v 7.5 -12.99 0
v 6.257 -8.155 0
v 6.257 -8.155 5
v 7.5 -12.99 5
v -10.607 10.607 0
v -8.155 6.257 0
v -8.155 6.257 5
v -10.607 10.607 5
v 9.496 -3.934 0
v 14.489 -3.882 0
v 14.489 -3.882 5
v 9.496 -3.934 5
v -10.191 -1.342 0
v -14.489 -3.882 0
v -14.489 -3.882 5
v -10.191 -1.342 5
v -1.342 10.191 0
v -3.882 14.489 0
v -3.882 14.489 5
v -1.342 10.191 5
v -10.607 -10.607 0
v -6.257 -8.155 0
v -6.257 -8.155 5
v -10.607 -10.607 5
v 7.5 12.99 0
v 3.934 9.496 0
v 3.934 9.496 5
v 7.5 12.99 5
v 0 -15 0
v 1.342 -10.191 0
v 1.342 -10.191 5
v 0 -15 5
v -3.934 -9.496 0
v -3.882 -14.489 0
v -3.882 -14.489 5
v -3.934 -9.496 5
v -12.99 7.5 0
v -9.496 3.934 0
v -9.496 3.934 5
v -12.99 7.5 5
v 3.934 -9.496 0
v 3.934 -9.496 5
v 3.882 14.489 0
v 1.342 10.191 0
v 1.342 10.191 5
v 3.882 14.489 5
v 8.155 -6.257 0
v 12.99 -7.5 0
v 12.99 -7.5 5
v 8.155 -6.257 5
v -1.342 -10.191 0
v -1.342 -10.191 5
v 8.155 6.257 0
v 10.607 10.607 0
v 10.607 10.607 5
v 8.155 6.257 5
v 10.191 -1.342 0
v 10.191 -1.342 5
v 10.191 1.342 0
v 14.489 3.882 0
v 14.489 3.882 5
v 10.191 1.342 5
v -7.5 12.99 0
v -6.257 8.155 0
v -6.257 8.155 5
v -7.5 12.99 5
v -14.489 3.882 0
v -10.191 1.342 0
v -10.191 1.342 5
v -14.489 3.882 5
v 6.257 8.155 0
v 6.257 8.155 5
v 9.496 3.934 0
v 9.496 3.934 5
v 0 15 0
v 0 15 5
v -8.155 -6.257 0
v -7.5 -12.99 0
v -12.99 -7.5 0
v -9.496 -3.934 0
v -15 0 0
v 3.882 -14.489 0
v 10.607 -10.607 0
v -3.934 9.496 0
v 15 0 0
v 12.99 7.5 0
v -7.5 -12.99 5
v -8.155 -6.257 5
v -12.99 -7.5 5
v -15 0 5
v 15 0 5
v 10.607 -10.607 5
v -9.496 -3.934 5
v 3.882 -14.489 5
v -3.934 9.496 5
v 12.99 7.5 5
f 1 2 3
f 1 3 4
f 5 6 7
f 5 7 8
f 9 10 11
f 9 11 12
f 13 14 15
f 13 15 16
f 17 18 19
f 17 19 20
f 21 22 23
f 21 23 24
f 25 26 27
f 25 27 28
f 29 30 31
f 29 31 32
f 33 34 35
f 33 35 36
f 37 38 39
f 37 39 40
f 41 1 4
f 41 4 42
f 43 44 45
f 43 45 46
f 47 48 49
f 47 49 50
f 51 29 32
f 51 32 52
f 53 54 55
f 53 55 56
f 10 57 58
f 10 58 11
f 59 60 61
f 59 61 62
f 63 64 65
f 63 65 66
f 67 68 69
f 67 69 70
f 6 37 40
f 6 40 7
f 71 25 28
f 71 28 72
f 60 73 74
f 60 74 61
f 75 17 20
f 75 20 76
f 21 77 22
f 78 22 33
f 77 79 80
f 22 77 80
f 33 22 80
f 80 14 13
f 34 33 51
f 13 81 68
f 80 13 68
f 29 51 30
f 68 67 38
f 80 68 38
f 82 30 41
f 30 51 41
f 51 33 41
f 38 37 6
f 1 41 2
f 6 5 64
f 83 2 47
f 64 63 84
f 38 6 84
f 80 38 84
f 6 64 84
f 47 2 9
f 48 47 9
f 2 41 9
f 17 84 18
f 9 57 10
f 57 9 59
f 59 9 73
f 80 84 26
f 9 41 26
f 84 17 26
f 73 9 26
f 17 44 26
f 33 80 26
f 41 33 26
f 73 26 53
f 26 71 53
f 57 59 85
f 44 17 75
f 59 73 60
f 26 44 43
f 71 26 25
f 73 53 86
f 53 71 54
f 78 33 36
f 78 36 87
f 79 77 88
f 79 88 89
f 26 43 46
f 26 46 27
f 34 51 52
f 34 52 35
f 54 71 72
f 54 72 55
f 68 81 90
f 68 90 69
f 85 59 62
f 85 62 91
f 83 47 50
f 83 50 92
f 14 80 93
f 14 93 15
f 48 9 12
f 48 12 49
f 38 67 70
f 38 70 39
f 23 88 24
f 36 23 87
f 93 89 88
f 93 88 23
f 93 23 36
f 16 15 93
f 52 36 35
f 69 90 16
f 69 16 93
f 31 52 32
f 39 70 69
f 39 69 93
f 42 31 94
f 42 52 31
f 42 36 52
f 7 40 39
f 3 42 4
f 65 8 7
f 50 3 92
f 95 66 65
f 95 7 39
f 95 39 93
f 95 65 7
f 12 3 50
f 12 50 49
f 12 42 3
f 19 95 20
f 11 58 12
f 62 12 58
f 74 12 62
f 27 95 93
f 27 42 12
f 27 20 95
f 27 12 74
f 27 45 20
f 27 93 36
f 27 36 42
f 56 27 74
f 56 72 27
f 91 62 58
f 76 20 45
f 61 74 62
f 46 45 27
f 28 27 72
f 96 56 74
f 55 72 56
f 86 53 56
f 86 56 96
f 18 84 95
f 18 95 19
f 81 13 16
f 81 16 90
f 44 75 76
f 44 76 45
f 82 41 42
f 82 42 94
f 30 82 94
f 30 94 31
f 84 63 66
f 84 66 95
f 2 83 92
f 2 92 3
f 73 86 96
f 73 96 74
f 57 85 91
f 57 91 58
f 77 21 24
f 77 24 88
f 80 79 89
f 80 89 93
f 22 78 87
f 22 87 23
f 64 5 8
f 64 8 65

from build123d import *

# Parameters (mm, degrees)
ESQUISSE1_R             = 15
BOSS_EXTRU_1_DEPTH      = 5
ENL_V_START             = -5
ENL_V_MAT_EXTRU_1_DEPTH = 5


with BuildPart() as part:
    # Esquisse1 → Boss.-Extru.1 (new body)
    with BuildSketch(Plane.XY):
        Circle(ESQUISSE1_R)
    extrude(amount=BOSS_EXTRU_1_DEPTH)

    # Esquisse2 → Enlèv. mat.-Extru.1 (cut)
    with BuildSketch(Plane.XY.offset(5).offset(ENL_V_START)):
        with BuildLine():
            Line((-6.257363421, 8.154754778), (-7.5, 12.990381057))
            ThreePointArc((-7.5, 12.990381057), (-9.131421435, 11.900300104), (-10.606601718, 10.606601718))
            Line((-10.606601718, 10.606601718), (-6.257363421, 8.154754778))
        make_face()
        with BuildLine():
            Line((-3.933543089, 9.496413072), (-3.882285677, 14.488887394))
            ThreePointArc((-3.882285677, 14.488887394), (-5.740251485, 13.858192988), (-7.5, 12.990381057))
            Line((-7.5, 12.990381057), (-3.933543089, 9.496413072))
        make_face()
        with BuildLine():
            Line((-1.341658295, 10.19090651), (0, 15))
            ThreePointArc((0, 15), (-1.957892883, 14.871672921), (-3.882285677, 14.488887394))
            Line((-3.882285677, 14.488887394), (-1.341658295, 10.19090651))
        make_face()
        with BuildLine():
            ThreePointArc((3.882285677, 14.488887394), (1.957892883, 14.871672921), (0, 15))
            Line((0, 15), (1.341658295, 10.19090651))
            Line((1.341658295, 10.19090651), (3.882285677, 14.488887394))
        make_face()
        with BuildLine():
            ThreePointArc((7.5, 12.990381057), (5.740251485, 13.858192988), (3.882285677, 14.488887394))
            Line((3.882285677, 14.488887394), (3.933543089, 9.496413072))
            Line((3.933543089, 9.496413072), (7.5, 12.990381057))
        make_face()
        with BuildLine():
            ThreePointArc((10.606601718, 10.606601718), (9.131421435, 11.900300104), (7.5, 12.990381057))
            Line((7.5, 12.990381057), (6.257363421, 8.154754778))
            Line((6.257363421, 8.154754778), (10.606601718, 10.606601718))
        make_face()
        with BuildLine():
            ThreePointArc((12.990381057, 7.5), (11.900300104, 9.131421435), (10.606601718, 10.606601718))
            Line((10.606601718, 10.606601718), (8.154754778, 6.257363421))
            Line((8.154754778, 6.257363421), (12.990381057, 7.5))
        make_face()
        with BuildLine():
            ThreePointArc((14.488887394, 3.882285677), (13.858192988, 5.740251485), (12.990381057, 7.5))
            Line((12.990381057, 7.5), (9.496413072, 3.933543089))
            Line((9.496413072, 3.933543089), (14.488887394, 3.882285677))
        make_face()
        with BuildLine():
            ThreePointArc((15, 0), (14.871672921, 1.957892883), (14.488887394, 3.882285677))
            Line((14.488887394, 3.882285677), (10.19090651, 1.341658295))
            Line((10.19090651, 1.341658295), (15, 0))
        make_face()
        with BuildLine():
            ThreePointArc((14.488887394, -3.882285677), (14.871672921, -1.957892883), (15, 0))
            Line((15, 0), (10.19090651, -1.341658295))
            Line((10.19090651, -1.341658295), (14.488887394, -3.882285677))
        make_face()
        with BuildLine():
            ThreePointArc((12.990381057, -7.5), (13.858192988, -5.740251485), (14.488887394, -3.882285677))
            Line((14.488887394, -3.882285677), (9.496413072, -3.933543089))
            Line((9.496413072, -3.933543089), (12.990381057, -7.5))
        make_face()
        with BuildLine():
            ThreePointArc((10.606601718, -10.606601718), (11.900300104, -9.131421435), (12.990381057, -7.5))
            Line((12.990381057, -7.5), (8.154754778, -6.257363421))
            Line((8.154754778, -6.257363421), (10.606601718, -10.606601718))
        make_face()
        with BuildLine():
            ThreePointArc((7.5, -12.990381057), (9.131421435, -11.900300104), (10.606601718, -10.606601718))
            Line((10.606601718, -10.606601718), (6.257363421, -8.154754778))
            Line((6.257363421, -8.154754778), (7.5, -12.990381057))
        make_face()
        with BuildLine():
            ThreePointArc((3.882285677, -14.488887394), (5.740251485, -13.858192988), (7.5, -12.990381057))
            Line((7.5, -12.990381057), (3.933543089, -9.496413072))
            Line((3.933543089, -9.496413072), (3.882285677, -14.488887394))
        make_face()
        with BuildLine():
            ThreePointArc((0, -15), (1.957892883, -14.871672921), (3.882285677, -14.488887394))
            Line((3.882285677, -14.488887394), (1.341658295, -10.19090651))
            Line((1.341658295, -10.19090651), (0, -15))
        make_face()
        with BuildLine():
            Line((-1.341658295, -10.19090651), (-3.882285677, -14.488887394))
            ThreePointArc((-3.882285677, -14.488887394), (-1.957892883, -14.871672921), (0, -15))
            Line((0, -15), (-1.341658295, -10.19090651))
        make_face()
        with BuildLine():
            Line((-3.933543089, -9.496413072), (-7.5, -12.990381057))
            ThreePointArc((-7.5, -12.990381057), (-5.740251485, -13.858192988), (-3.882285677, -14.488887394))
            Line((-3.882285677, -14.488887394), (-3.933543089, -9.496413072))
        make_face()
        with BuildLine():
            Line((-6.257363421, -8.154754778), (-10.606601718, -10.606601718))
            ThreePointArc((-10.606601718, -10.606601718), (-9.131421435, -11.900300104), (-7.5, -12.990381057))
            Line((-7.5, -12.990381057), (-6.257363421, -8.154754778))
        make_face()
        with BuildLine():
            Line((-8.154754778, -6.257363421), (-12.990381057, -7.5))
            ThreePointArc((-12.990381057, -7.5), (-11.900300104, -9.131421435), (-10.606601718, -10.606601718))
            Line((-10.606601718, -10.606601718), (-8.154754778, -6.257363421))
        make_face()
        with BuildLine():
            Line((-9.496413072, -3.933543089), (-14.488887394, -3.882285677))
            ThreePointArc((-14.488887394, -3.882285677), (-13.858192988, -5.740251485), (-12.990381057, -7.5))
            Line((-12.990381057, -7.5), (-9.496413072, -3.933543089))
        make_face()
        with BuildLine():
            Line((-10.19090651, -1.341658295), (-15, 0))
            ThreePointArc((-15, 0), (-14.871672921, -1.957892883), (-14.488887394, -3.882285677))
            Line((-14.488887394, -3.882285677), (-10.19090651, -1.341658295))
        make_face()
        with BuildLine():
            Line((-10.19090651, 1.341658295), (-14.488887394, 3.882285677))
            ThreePointArc((-14.488887394, 3.882285677), (-14.871672921, 1.957892883), (-15, 0))
            Line((-15, 0), (-10.19090651, 1.341658295))
        make_face()
        with BuildLine():
            Line((-9.496413072, 3.933543089), (-12.990381057, 7.5))
            ThreePointArc((-12.990381057, 7.5), (-13.858192988, 5.740251485), (-14.488887394, 3.882285677))
            Line((-14.488887394, 3.882285677), (-9.496413072, 3.933543089))
        make_face()
        with BuildLine():
            Line((-8.154754778, 6.257363421), (-10.606601718, 10.606601718))
            ThreePointArc((-10.606601718, 10.606601718), (-11.900300104, 9.131421435), (-12.990381057, 7.5))
            Line((-12.990381057, 7.5), (-8.154754778, 6.257363421))
        make_face()
    extrude(amount=ENL_V_MAT_EXTRU_1_DEPTH, mode=Mode.SUBTRACT)


solid = part.part
